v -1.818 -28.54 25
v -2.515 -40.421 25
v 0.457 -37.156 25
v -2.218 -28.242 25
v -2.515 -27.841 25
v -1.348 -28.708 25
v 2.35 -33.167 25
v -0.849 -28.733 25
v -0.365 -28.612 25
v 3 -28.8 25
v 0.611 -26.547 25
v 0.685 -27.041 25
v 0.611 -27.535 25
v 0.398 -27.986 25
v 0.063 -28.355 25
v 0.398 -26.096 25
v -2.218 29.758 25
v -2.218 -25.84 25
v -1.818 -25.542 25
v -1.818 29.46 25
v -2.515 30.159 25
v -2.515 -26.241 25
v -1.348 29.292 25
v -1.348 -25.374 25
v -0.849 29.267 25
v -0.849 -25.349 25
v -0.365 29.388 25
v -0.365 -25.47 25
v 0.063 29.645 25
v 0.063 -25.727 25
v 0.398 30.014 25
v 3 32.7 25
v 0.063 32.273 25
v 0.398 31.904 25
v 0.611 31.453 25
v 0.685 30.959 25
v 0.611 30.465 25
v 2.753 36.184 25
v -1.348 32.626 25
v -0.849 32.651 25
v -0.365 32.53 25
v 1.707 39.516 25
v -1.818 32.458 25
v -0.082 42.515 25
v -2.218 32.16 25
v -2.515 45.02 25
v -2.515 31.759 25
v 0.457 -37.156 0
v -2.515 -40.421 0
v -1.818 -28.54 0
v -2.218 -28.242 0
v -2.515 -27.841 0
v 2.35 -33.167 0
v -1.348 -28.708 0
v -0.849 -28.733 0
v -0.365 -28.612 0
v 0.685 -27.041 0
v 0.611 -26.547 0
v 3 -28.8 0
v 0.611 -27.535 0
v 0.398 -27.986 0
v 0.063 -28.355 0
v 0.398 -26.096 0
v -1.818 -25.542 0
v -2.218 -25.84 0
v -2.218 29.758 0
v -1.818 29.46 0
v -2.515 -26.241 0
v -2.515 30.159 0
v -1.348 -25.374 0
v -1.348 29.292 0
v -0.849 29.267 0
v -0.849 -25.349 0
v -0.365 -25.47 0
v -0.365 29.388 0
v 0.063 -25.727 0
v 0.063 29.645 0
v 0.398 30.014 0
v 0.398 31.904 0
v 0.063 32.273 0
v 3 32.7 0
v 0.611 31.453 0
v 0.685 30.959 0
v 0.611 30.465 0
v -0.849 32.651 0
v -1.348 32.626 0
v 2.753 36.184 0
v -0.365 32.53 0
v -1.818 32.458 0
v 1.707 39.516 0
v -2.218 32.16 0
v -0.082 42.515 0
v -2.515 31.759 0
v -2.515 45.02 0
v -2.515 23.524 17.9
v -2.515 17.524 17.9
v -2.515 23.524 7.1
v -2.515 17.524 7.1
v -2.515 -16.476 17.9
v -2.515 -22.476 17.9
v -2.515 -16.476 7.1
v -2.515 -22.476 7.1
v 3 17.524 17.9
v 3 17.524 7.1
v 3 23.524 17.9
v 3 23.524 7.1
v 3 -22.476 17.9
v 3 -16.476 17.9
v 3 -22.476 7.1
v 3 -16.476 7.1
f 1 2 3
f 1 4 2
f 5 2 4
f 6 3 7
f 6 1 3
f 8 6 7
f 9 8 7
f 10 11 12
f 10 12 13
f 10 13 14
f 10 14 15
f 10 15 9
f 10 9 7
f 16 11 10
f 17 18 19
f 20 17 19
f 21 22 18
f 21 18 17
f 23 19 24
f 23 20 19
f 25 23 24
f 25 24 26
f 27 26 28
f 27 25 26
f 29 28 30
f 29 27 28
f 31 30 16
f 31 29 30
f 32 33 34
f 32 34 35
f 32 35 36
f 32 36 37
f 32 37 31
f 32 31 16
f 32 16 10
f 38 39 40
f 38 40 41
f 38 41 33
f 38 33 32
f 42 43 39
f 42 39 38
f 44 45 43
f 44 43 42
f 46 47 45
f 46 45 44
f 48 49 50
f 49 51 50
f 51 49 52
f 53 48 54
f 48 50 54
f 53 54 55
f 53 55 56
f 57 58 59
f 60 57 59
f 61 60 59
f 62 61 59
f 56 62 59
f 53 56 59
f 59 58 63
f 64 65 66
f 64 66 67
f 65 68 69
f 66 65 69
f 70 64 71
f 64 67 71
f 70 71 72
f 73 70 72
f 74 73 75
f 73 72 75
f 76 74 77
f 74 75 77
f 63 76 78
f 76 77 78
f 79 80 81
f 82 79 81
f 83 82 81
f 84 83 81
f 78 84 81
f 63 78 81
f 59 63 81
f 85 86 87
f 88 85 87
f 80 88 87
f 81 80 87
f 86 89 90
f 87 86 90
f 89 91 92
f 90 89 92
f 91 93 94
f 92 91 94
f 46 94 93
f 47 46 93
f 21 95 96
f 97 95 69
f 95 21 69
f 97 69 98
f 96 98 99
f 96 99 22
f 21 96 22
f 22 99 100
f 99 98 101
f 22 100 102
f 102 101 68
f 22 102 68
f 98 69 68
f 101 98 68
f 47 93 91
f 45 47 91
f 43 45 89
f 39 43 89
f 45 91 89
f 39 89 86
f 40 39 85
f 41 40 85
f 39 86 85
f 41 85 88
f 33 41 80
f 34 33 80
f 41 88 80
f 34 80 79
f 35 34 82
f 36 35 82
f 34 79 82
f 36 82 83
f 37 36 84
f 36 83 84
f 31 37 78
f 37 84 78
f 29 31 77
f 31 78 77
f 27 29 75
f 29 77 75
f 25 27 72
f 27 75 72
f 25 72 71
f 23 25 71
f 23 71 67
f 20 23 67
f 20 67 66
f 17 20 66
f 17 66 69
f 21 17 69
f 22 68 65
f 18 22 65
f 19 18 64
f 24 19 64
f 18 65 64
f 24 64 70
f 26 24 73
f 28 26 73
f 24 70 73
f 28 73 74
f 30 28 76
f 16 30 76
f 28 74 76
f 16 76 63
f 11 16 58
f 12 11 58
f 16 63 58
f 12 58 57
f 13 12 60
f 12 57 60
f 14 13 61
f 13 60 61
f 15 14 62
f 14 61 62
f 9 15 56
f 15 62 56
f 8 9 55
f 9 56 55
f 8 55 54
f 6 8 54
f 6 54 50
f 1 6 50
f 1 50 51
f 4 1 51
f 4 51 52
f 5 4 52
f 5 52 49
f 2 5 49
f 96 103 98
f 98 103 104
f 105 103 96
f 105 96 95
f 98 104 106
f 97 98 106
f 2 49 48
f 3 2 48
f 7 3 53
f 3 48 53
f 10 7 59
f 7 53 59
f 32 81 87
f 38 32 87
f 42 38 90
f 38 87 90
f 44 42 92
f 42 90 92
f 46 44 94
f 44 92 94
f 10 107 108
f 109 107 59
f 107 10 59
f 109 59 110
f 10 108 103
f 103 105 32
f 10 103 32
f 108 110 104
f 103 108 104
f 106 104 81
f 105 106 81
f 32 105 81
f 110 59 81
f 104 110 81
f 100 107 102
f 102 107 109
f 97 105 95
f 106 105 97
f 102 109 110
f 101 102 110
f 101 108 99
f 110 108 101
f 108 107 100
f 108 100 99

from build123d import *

# Parameters (mm, degrees)
BOSS_EXTRU_1_DEPTH      = 25
ESQUISSE6_W             = 10.8
ESQUISSE6_H             = 6
ENL_V_MAT_EXTRU_5_DEPTH = 16


with BuildPart() as part:
    # Esquisse1 → Boss.-Extru.1 (new body)
    with BuildSketch(Plane.XY):
        with BuildLine():
            Line((-2.515260994, 35.459016609), (-2.515260994, 31.759016609))
            ThreePointArc((-2.515260994, 31.759016609), (0.684739006, 30.959016609), (-2.515260994, 30.159016609))
            Line((-2.515260994, 30.159016609), (-2.515260994, -26.240983391))
            ThreePointArc((-2.515260994, -26.240983391), (0.684739006, -27.040983391), (-2.515260994, -27.840983391))
            Line((-2.515260994, -27.840983391), (-2.515260994, -40.420659447))
            ThreePointArc((-2.515260994, -40.420659447), (1.551219227, -35.231520618), (3, -28.8))
            Line((3, -28.8), (3, 32.7))
            ThreePointArc((3, 32.7), (1.706542051, 39.51560803), (-2.515260994, 45.020326491))
            Line((-2.515260994, 45.020326491), (-2.515260994, 35.459016609))
        make_face()
    extrude(amount=BOSS_EXTRU_1_DEPTH)

    # Esquisse6 → Enlèv. mat.-Extru.5 (cut)
    with BuildSketch(Plane(origin=(3, 0, 0), x_dir=(0, 0, -1), z_dir=(1, 0, 0))):
        with Locations((-12.5, 20.524263914)):
            Rectangle(ESQUISSE6_W, ESQUISSE6_H)
        with Locations((-12.5, -19.475736086)):
            Rectangle(ESQUISSE6_W, ESQUISSE6_H)
    extrude(amount=-ENL_V_MAT_EXTRU_5_DEPTH, mode=Mode.SUBTRACT)


solid = part.part
